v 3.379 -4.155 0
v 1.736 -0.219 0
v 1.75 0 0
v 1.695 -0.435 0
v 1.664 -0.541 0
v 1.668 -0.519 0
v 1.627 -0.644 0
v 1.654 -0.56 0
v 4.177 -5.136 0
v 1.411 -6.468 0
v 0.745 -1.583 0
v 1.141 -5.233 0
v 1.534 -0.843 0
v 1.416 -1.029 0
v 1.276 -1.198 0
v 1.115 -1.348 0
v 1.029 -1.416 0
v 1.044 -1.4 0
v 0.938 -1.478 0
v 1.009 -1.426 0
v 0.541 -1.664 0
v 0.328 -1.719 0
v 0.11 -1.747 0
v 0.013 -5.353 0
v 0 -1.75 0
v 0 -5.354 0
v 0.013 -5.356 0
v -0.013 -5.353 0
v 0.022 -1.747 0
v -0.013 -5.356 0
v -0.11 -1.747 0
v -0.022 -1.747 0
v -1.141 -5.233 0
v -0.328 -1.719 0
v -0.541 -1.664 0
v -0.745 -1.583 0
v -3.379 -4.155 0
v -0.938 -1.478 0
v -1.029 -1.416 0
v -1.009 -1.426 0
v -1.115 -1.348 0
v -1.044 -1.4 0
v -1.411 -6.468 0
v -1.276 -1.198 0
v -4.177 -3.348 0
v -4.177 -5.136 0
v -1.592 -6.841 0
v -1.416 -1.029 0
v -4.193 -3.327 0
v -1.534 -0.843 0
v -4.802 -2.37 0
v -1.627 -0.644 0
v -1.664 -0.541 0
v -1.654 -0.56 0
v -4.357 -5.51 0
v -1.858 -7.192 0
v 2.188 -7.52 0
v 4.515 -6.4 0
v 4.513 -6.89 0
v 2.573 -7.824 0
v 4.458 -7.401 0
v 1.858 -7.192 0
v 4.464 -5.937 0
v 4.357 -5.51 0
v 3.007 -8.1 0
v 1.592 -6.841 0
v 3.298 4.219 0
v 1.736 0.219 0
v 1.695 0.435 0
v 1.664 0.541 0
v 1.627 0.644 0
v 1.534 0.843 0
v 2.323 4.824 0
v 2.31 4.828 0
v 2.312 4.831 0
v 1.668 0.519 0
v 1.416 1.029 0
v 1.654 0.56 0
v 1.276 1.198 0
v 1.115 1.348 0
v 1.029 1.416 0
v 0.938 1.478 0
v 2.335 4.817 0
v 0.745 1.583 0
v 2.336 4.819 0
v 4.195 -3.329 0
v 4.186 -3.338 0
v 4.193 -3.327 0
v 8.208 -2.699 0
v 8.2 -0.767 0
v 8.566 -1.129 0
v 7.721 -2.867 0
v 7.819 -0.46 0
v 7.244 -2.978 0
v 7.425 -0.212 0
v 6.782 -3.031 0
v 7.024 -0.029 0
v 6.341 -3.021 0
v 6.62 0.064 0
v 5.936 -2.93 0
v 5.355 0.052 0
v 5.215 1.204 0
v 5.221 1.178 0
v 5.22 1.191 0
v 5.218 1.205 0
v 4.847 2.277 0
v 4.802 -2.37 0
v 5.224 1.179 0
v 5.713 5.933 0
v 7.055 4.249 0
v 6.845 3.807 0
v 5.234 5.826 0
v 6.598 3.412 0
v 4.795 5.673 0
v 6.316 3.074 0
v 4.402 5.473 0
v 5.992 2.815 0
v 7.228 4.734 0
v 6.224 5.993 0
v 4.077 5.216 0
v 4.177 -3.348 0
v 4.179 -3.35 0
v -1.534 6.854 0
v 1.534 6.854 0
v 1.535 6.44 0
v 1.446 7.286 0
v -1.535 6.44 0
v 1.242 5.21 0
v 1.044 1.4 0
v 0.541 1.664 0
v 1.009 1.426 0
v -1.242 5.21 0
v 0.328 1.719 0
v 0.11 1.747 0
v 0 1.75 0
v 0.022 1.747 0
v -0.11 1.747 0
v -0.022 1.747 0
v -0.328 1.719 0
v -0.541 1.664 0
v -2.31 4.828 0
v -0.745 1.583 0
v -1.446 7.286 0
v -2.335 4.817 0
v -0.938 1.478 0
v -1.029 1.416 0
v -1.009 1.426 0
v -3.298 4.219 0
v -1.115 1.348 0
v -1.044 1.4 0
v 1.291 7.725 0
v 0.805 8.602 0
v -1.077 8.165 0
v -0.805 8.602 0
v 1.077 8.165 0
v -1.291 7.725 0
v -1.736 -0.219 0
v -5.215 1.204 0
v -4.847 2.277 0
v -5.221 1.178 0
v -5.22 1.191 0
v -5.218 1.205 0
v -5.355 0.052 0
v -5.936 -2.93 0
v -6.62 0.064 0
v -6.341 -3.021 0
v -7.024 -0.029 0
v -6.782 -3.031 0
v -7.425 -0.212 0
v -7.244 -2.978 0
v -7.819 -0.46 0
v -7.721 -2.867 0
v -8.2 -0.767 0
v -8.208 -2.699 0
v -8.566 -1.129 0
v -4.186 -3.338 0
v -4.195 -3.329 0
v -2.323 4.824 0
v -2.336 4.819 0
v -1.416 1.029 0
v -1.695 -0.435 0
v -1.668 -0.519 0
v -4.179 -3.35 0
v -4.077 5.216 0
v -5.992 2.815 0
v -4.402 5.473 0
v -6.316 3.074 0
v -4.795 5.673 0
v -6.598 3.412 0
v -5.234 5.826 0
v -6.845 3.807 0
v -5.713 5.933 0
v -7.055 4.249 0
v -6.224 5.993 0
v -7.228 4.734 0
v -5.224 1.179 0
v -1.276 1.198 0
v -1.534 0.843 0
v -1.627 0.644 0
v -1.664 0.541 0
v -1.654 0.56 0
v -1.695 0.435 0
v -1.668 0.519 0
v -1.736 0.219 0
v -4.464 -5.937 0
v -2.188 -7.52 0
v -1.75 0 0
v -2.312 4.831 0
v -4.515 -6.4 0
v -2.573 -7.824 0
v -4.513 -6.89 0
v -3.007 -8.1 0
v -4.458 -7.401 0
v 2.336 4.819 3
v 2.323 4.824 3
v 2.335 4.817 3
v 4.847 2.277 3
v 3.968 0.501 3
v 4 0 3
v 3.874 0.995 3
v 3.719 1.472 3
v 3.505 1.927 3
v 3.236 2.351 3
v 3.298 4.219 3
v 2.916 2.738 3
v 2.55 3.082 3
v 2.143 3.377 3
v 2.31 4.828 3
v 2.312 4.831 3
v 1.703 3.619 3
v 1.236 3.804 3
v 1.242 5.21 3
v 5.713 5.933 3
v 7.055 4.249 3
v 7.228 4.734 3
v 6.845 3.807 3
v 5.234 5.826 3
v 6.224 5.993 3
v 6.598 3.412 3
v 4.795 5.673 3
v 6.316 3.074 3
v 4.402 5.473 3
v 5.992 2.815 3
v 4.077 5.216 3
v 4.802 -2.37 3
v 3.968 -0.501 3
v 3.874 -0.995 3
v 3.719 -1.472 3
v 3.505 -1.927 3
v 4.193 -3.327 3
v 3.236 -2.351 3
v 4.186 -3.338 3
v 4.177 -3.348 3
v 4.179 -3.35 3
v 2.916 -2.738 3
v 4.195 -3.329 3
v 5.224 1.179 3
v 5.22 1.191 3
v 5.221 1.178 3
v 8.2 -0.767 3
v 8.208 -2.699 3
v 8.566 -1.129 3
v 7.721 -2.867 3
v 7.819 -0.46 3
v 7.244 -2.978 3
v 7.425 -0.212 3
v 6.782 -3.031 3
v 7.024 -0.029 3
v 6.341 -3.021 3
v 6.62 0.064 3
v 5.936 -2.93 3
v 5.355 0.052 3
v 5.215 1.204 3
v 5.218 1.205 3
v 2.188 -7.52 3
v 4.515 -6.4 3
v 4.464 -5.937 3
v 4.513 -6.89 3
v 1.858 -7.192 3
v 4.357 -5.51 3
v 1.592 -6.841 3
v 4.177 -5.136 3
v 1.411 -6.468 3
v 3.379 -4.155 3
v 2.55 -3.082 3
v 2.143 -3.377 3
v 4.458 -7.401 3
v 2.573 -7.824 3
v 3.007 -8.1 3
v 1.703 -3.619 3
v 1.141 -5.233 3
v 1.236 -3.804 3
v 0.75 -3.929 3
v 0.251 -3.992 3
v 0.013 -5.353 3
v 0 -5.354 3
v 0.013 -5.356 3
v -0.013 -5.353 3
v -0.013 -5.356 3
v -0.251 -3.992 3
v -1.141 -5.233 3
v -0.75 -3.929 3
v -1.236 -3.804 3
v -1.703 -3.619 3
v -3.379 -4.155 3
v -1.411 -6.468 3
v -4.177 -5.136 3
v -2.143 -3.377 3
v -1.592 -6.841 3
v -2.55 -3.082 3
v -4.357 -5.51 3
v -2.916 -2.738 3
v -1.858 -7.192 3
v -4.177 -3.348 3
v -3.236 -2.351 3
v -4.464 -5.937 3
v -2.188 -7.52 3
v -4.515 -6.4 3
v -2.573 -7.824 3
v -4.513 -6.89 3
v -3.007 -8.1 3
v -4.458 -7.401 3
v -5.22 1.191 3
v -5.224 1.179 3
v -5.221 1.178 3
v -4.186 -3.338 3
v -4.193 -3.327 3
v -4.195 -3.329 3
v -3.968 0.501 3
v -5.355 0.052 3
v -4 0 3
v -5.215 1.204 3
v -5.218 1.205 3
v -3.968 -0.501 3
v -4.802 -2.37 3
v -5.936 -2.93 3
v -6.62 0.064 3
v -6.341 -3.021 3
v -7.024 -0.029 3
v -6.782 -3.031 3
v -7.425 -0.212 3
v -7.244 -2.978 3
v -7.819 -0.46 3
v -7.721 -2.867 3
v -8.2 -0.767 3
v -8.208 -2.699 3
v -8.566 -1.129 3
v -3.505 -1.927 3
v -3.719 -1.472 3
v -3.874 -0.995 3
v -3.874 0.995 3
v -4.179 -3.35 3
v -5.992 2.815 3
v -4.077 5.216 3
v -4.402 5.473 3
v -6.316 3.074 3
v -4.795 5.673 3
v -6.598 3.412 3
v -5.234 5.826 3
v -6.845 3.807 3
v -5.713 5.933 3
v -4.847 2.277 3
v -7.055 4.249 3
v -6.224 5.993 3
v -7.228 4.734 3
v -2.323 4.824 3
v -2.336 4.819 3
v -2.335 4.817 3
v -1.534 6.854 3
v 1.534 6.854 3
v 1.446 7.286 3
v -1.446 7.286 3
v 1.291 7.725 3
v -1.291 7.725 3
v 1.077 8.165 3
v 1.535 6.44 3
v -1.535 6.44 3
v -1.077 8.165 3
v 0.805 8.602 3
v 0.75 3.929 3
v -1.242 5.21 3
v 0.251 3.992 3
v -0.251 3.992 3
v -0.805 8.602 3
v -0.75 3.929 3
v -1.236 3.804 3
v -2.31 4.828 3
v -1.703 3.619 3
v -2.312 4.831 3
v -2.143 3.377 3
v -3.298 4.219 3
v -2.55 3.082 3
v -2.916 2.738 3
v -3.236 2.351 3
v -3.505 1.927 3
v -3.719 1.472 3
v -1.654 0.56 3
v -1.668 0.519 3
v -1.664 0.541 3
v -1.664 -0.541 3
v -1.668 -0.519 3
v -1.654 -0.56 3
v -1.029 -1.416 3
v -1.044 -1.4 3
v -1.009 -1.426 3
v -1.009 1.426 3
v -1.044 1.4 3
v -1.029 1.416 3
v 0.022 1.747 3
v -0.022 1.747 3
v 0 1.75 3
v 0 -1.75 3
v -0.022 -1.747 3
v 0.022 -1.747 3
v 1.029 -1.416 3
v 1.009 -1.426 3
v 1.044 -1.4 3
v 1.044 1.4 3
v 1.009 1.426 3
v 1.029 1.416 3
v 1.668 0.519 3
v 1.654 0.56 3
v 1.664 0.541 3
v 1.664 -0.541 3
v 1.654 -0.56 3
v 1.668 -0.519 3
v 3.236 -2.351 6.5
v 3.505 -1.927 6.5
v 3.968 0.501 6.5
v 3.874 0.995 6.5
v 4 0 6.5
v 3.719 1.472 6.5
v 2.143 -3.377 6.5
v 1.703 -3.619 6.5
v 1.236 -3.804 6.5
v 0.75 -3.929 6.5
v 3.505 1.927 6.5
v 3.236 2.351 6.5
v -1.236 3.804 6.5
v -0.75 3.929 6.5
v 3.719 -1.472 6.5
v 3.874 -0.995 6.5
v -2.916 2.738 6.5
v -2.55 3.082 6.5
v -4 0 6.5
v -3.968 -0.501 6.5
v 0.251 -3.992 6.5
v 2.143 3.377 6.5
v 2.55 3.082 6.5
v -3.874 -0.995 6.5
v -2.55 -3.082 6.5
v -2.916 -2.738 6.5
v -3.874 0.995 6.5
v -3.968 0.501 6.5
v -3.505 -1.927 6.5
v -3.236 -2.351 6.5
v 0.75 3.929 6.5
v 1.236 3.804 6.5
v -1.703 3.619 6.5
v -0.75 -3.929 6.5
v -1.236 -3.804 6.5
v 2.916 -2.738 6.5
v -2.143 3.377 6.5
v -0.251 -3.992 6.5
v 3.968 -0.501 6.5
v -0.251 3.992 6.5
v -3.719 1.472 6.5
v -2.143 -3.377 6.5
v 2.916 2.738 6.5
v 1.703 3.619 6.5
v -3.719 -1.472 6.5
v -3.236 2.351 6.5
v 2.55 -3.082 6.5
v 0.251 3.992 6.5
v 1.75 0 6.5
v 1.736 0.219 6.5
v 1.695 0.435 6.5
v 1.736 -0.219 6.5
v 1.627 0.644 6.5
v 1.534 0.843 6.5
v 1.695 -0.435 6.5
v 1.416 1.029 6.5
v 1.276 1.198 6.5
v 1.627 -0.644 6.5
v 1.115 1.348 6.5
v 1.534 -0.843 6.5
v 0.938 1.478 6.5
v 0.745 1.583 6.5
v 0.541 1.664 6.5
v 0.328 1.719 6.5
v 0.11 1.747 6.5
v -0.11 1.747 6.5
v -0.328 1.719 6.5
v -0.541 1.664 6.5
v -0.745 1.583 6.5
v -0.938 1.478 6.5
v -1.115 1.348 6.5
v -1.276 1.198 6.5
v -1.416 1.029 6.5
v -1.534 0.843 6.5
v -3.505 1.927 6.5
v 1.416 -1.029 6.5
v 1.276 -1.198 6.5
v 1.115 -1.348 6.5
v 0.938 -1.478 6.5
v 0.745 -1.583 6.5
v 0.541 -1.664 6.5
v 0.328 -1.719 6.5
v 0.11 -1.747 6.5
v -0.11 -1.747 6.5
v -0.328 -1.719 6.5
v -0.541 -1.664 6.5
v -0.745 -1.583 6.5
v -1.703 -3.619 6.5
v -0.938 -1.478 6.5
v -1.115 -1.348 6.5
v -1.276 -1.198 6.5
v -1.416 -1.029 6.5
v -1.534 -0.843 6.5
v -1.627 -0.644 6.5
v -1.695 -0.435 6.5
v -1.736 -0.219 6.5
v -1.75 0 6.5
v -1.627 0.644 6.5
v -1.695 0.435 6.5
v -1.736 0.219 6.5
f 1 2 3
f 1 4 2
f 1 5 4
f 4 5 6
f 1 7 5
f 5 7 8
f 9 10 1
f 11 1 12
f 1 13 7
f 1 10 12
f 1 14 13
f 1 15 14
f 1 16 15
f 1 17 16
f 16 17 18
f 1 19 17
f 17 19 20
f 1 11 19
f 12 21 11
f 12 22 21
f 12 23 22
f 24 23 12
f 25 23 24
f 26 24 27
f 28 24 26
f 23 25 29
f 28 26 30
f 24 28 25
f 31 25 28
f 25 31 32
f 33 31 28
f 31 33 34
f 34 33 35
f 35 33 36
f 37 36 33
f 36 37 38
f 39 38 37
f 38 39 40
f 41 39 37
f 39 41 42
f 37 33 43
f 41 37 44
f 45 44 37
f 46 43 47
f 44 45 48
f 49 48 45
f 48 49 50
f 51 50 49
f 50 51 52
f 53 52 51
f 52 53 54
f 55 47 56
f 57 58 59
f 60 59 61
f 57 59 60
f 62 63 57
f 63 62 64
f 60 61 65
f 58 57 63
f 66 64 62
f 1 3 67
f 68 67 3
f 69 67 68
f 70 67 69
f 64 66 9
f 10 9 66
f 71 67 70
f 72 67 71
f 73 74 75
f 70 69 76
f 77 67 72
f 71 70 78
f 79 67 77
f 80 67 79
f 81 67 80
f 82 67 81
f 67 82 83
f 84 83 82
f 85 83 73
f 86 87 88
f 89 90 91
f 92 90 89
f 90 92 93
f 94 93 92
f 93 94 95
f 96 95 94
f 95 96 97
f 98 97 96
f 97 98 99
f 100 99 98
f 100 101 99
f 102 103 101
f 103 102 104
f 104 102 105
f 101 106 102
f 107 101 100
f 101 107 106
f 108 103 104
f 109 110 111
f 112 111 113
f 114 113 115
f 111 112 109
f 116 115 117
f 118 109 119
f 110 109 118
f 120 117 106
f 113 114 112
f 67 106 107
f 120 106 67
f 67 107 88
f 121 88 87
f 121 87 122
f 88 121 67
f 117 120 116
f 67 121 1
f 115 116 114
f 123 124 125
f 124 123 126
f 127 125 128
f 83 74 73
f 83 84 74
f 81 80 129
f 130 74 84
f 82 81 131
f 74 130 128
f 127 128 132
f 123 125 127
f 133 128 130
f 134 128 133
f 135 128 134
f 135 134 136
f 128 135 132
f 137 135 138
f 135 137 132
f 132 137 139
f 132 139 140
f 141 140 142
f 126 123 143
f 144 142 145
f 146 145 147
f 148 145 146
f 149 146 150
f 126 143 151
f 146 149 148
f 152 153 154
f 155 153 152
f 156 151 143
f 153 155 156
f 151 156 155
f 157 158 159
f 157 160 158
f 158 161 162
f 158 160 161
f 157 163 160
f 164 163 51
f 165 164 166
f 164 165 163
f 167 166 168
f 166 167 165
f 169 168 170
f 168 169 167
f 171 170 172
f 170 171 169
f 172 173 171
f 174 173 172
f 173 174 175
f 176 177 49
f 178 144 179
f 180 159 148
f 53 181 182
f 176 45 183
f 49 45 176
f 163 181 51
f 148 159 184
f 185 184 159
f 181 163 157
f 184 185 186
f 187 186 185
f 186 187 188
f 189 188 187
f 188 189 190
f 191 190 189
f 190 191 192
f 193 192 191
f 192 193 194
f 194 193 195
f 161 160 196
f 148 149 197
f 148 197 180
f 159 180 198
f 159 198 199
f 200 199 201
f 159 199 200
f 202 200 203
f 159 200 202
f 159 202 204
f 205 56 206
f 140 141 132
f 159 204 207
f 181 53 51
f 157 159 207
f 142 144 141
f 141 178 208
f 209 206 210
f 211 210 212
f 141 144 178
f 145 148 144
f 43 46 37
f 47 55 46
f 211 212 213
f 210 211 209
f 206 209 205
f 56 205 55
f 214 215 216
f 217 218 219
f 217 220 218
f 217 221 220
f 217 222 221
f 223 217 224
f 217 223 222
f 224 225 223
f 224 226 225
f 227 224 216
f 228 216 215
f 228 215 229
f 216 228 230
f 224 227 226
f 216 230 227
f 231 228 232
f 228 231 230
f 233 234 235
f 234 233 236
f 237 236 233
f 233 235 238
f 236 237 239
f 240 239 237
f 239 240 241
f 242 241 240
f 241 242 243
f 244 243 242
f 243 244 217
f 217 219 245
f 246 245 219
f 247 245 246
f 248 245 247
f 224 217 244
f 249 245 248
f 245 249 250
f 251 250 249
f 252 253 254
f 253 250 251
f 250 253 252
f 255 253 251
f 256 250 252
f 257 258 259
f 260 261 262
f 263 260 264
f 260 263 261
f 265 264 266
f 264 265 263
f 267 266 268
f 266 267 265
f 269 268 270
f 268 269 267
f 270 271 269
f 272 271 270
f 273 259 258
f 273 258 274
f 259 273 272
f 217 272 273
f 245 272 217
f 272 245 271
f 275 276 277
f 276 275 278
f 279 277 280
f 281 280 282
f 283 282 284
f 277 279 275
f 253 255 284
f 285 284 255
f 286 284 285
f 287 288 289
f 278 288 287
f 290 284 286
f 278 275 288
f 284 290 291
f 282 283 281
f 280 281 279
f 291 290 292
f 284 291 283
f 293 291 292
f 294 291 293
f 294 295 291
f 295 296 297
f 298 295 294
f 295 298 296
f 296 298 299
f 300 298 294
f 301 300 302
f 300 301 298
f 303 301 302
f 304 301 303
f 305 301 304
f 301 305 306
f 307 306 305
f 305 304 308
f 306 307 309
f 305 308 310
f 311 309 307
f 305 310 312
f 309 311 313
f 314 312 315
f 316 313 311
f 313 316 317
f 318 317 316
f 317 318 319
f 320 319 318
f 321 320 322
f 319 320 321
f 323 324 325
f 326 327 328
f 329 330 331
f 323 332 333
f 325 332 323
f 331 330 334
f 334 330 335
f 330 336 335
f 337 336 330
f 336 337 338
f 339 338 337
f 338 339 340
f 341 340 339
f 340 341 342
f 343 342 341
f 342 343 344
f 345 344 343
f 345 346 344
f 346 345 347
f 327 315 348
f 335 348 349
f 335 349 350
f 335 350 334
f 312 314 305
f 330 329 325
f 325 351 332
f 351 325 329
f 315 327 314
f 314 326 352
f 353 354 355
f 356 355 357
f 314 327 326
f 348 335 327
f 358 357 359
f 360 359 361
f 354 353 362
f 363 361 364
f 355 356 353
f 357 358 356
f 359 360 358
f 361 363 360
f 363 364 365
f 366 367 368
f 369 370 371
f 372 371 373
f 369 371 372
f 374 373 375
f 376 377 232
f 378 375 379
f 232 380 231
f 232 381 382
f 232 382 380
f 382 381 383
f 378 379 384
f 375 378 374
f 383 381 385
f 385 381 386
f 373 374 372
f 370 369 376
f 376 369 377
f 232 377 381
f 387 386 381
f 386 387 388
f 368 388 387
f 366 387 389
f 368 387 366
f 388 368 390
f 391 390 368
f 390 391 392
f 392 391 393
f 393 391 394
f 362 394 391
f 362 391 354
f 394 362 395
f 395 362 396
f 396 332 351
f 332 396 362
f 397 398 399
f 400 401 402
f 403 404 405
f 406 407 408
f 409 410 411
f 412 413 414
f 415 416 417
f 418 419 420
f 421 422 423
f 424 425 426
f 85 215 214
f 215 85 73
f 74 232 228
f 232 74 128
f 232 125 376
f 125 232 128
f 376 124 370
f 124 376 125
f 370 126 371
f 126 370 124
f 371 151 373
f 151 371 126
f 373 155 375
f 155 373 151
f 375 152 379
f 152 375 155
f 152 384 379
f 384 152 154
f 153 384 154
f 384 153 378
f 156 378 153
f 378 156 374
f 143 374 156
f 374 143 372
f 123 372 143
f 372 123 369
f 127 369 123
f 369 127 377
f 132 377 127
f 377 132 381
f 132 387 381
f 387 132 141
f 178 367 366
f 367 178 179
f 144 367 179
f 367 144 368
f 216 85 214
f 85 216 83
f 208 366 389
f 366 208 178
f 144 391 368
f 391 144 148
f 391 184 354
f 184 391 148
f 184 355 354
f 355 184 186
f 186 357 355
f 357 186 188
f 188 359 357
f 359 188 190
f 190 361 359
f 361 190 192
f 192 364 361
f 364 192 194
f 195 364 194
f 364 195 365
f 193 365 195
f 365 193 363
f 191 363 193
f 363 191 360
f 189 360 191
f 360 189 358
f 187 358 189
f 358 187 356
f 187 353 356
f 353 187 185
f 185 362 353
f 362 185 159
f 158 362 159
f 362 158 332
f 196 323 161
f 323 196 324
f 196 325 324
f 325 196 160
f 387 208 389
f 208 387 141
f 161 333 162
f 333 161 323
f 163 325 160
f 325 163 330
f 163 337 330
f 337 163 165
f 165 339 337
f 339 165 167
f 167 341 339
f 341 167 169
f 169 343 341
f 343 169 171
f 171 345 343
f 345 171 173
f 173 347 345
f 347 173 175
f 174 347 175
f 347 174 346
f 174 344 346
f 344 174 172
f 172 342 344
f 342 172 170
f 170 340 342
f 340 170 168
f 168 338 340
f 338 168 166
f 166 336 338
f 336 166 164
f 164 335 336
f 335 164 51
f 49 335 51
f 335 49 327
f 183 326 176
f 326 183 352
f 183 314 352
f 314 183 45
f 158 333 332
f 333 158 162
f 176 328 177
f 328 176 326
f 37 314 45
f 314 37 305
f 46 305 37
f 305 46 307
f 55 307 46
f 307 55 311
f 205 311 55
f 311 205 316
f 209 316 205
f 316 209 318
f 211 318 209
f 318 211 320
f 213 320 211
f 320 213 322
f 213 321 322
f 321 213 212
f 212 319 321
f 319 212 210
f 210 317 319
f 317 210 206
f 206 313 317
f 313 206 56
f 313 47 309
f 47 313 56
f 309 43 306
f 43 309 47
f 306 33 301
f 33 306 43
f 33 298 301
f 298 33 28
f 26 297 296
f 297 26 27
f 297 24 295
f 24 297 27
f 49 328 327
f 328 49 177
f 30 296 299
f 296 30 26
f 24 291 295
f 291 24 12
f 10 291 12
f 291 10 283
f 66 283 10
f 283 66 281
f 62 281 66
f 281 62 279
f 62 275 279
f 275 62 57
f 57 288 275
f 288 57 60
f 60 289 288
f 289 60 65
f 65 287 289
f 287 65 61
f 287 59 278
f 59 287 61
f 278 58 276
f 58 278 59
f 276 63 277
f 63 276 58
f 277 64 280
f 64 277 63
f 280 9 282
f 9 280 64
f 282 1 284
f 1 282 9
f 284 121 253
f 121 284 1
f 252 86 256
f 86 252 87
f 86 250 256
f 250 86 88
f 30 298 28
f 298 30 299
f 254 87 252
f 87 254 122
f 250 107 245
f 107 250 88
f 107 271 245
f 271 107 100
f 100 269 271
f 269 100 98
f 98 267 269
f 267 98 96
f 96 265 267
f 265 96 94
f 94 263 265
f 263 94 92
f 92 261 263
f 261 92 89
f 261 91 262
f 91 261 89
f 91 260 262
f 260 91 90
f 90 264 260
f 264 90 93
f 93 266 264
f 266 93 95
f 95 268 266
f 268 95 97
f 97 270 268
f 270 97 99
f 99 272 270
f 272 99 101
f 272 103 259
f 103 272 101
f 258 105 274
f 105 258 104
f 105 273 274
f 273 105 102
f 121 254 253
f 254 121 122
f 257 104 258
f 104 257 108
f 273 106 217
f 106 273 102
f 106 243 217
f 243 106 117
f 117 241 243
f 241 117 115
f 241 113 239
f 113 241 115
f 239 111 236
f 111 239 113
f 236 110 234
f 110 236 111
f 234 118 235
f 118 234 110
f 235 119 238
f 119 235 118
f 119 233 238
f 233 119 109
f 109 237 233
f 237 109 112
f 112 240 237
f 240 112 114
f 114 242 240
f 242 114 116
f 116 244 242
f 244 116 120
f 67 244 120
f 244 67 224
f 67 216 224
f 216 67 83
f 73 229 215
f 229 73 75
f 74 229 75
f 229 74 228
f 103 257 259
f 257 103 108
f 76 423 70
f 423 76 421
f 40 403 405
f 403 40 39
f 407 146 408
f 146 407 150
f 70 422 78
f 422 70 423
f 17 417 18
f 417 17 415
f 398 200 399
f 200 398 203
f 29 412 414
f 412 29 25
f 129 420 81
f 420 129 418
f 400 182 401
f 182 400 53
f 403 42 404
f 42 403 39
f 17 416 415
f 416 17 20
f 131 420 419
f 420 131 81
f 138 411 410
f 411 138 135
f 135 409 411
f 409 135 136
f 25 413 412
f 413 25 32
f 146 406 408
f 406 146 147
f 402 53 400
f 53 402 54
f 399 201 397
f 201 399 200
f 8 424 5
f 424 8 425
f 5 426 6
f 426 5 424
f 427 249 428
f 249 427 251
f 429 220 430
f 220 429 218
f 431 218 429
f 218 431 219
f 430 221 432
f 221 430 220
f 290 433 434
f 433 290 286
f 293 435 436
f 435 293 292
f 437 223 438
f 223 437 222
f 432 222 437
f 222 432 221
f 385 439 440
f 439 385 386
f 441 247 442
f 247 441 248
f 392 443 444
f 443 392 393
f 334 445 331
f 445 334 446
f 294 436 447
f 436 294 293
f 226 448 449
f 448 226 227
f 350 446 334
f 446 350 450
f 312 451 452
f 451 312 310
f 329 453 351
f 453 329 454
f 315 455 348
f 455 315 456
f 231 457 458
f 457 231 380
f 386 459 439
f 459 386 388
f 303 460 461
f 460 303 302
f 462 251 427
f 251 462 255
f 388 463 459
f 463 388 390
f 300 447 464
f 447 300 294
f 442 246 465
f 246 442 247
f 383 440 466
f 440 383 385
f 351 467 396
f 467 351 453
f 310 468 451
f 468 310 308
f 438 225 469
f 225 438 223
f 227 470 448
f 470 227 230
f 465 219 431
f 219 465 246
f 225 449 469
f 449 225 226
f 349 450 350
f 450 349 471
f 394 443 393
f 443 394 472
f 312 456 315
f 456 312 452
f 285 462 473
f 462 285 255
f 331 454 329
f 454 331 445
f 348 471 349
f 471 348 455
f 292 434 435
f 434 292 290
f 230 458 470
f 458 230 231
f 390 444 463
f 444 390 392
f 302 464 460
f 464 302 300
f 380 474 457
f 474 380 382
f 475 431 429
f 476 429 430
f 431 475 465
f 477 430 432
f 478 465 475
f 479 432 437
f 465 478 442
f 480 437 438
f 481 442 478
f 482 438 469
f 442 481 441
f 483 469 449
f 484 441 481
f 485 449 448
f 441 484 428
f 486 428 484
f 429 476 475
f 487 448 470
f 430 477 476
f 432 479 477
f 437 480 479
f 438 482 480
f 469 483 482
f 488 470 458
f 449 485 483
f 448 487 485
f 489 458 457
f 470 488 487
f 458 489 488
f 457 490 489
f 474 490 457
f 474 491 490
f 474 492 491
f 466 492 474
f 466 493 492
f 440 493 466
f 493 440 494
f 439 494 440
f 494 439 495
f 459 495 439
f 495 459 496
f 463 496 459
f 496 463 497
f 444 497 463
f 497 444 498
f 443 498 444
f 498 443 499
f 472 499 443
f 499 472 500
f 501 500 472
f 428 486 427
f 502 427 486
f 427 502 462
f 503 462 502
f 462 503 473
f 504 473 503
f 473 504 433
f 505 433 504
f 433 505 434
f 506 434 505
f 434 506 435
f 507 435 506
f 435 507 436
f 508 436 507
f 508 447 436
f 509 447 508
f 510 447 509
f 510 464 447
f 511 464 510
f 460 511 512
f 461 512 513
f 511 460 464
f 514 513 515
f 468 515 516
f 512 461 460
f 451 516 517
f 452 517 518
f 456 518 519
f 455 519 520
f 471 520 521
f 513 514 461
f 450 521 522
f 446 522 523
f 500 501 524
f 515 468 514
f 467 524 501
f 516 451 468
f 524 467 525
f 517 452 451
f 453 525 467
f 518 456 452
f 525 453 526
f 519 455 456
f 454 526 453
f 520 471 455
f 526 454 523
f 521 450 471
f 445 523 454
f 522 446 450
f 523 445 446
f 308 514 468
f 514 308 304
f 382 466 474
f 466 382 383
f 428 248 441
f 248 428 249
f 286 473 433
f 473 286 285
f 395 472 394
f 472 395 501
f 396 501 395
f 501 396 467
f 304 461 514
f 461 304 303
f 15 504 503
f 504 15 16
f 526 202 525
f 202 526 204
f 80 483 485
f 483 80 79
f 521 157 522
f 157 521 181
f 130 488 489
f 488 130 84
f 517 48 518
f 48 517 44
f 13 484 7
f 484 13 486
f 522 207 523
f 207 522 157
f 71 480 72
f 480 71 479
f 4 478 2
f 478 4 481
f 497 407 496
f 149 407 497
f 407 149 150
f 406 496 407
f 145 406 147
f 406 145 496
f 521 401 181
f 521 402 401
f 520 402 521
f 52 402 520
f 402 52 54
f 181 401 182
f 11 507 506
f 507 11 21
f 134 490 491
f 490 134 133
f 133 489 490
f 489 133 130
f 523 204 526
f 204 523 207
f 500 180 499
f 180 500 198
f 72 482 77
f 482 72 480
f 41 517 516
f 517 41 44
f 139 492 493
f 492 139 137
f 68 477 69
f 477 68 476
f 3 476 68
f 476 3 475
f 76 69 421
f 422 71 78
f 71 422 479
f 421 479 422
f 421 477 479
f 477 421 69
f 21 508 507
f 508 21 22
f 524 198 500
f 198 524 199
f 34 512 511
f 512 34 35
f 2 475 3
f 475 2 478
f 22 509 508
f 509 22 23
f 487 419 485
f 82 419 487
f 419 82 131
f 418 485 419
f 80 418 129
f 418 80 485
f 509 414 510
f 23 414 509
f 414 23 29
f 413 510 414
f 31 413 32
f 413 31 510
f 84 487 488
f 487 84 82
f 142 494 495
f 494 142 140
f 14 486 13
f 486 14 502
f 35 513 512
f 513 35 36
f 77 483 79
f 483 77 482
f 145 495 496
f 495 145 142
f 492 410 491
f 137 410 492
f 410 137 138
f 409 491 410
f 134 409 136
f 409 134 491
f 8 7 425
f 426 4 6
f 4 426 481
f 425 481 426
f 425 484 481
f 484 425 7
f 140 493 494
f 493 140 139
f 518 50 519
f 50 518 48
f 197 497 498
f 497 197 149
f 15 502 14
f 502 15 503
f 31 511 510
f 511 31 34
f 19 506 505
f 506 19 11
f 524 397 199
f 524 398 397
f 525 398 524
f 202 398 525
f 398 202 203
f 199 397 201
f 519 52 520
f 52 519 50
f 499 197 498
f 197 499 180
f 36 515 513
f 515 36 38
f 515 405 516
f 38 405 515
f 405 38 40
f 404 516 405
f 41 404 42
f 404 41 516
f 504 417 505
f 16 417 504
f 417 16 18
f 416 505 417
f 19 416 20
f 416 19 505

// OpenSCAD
//////////////////////////////////////////////////////////////////////////////////////////////
// Public Domain Parametric Involute Spur Gear (and involute helical gear and involute rack)
// version 1.1
// by Leemon Baird, 2011, Leemon@Leemon.com
//http://www.thingiverse.com/thing:5505
//
// This file is public domain.  Use it for any purpose, including commercial
// applications.  Attribution would be nice, but is not required.  There is
// no warranty of any kind, including its correctness, usefulness, or safety.
// 
// This is parameterized involute spur (or helical) gear.  It is much simpler and less powerful than
// others on Thingiverse.  But it is public domain.  I implemented it from scratch from the 
// descriptions and equations on Wikipedia and the web, using Mathematica for calculations and testing,
// and I now release it into the public domain.
//
//		http://en.wikipedia.org/wiki/Involute_gear
//		http://en.wikipedia.org/wiki/Gear
//		http://en.wikipedia.org/wiki/List_of_gear_nomenclature
//		http://gtrebaol.free.fr/doc/catia/spur_gear.html
//		http://www.cs.cmu.edu/~rapidproto/mechanisms/chpt7.html
//
// The module gear() gives an involute spur gear, with reasonable defaults for all the parameters.
// Normally, you should just choose the first 4 parameters, and let the rest be default values.
// The module gear() gives a gear in the XY plane, centered on the origin, with one tooth centered on
// the positive Y axis.  The various functions below it take the same parameters, and return various
// measurements for the gear.  The most important is pitch_radius, which tells how far apart to space
// gears that are meshing, and adendum_radius, which gives the size of the region filled by the gear.
// A gear has a "pitch circle", which is an invisible circle that cuts through the middle of each
// tooth (though not the exact center). In order for two gears to mesh, their pitch circles should 
// just touch.  So the distance between their centers should be pitch_radius() for one, plus pitch_radius() 
// for the other, which gives the radii of their pitch circles.
//
// In order for two gears to mesh, they must have the same mm_per_tooth and pressure_angle parameters.  
// mm_per_tooth gives the number of millimeters of arc around the pitch circle covered by one tooth and one
// space between teeth.  The pitch angle controls how flat or bulged the sides of the teeth are.  Common
// values include 14.5 degrees and 20 degrees, and occasionally 25.  Though I've seen 28 recommended for
// plastic gears. Larger numbers bulge out more, giving stronger teeth, so 28 degrees is the default here.
//
// The ratio of number_of_teeth for two meshing gears gives how many times one will make a full 
// revolution when the the other makes one full revolution.  If the two numbers are coprime (i.e. 
// are not both divisible by the same number greater than 1), then every tooth on one gear
// will meet every tooth on the other, for more even wear.  So coprime numbers of teeth are good.
//
// The module rack() gives a rack, which is a bar with teeth.  A rack can mesh with any
// gear that has the same mm_per_tooth and pressure_angle.
//
// Some terminology: 
// The outline of a gear is a smooth circle (the "pitch circle") which has mountains and valleys
// added so it is toothed.  So there is an inner circle (the "root circle") that touches the 
// base of all the teeth, an outer circle that touches the tips of all the teeth,
// and the invisible pitch circle in between them.  There is also a "base circle", which can be smaller than
// all three of the others, which controls the shape of the teeth.  The side of each tooth lies on the path 
// that the end of a string would follow if it were wrapped tightly around the base circle, then slowly unwound.  
// That shape is an "involute", which gives this type of gear its name.
//
//////////////////////////////////////////////////////////////////////////////////////////////

translate([0,0,1.5]){

	difference(){
		union(){
			gear();
			
			translate([0,0,1.5])
			cylinder(r=4, h=3.5, $fn=50);

		}
		
		cylinder(r=3.5/2, h=20, $fn=50, center=true);	//hole for M3 screw
		
	
	}

}



//An involute spur gear, with reasonable defaults for all the parameters.
//Normally, you should just choose the first 4 parameters, and let the rest be default values.
//Meshing gears must match in mm_per_tooth, pressure_angle, and twist,
//and be separated by the sum of their pitch radii, which can be found with pitch_radius().
module gear (
	mm_per_tooth    = 6.73,    //this is the "circular pitch", the circumference of the pitch circle divided by the number of teeth
	number_of_teeth = 7,   //total number of teeth around the entire perimeter
	thickness       = 3,    //thickness of gear in mm
	hole_diameter   = 3.5,    //diameter of the hole in the center, in mm
	twist           = 0,    //teeth rotate this many degrees from bottom of gear to top.  360 makes the gear a screw with each thread going around once
	teeth_to_hide   = 0,    //number of teeth to delete to make this only a fraction of a circle
	pressure_angle  = 28,   //Controls how straight or bulged the tooth sides are. In degrees.
	clearance       = 1,  //gap between top of a tooth on one gear and bottom of valley on a meshing gear (in millimeters)
	backlash        = 1   //gap between two meshing teeth, in the direction along the circumference of the pitch circle
) {
	assign(pi = 3.1415926)
	assign(p  = mm_per_tooth * number_of_teeth / pi / 2)  //radius of pitch circle
	assign(c  = p + mm_per_tooth / pi - clearance)        //radius of outer circle
	assign(b  = p*cos(pressure_angle))                    //radius of base circle
	assign(r  = p-(c-p)-clearance)                        //radius of root circle
	assign(t  = mm_per_tooth/2-backlash/2)                //tooth thickness at pitch circle
	assign(k  = -iang(b, p) - t/2/p/pi*180) {             //angle to where involute meets base circle on each side of tooth
		difference() {
			for (i = [0:number_of_teeth-teeth_to_hide-1] )
				rotate([0,0,i*360/number_of_teeth])
					linear_extrude(height = thickness, center = true, convexity = 10, twist = twist)
						polygon(
							points=[
								[0, -hole_diameter/10],
								polar(r, -181/number_of_teeth),
								polar(r, r<b ? k : -180/number_of_teeth),
								q7(0/5,r,b,c,k, 1),q7(1/5,r,b,c,k, 1),q7(2/5,r,b,c,k, 1),q7(3/5,r,b,c,k, 1),q7(4/5,r,b,c,k, 1),q7(5/5,r,b,c,k, 1),
								q7(5/5,r,b,c,k,-1),q7(4/5,r,b,c,k,-1),q7(3/5,r,b,c,k,-1),q7(2/5,r,b,c,k,-1),q7(1/5,r,b,c,k,-1),q7(0/5,r,b,c,k,-1),
								polar(r, r<b ? -k : 180/number_of_teeth),
								polar(r, 181/number_of_teeth)
							],
 							paths=[[0,1,2,3,4,5,6,7,8,9,10,11,12,13,14,15,16]]
						);
			cylinder(h=2*thickness+1, r=hole_diameter/2, center=true, $fn=20);
		}
	}
};	
//these 4 functions are used by gear
function polar(r,theta)   = r*[sin(theta), cos(theta)];                            //convert polar to cartesian coordinates
function iang(r1,r2)      = sqrt((r2/r1)*(r2/r1) - 1)/3.1415926*180 - acos(r1/r2); //unwind a string this many degrees to go from radius r1 to radius r2
function q7(f,r,b,r2,t,s) = q6(b,s,t,(1-f)*max(b,r)+f*r2);                         //radius a fraction f up the curved side of the tooth 
function q6(b,s,t,d)      = polar(d,s*(iang(b,d)+t));                              //point at radius d on the involute curve

//a rack, which is a straight line with teeth (the same as a segment from a giant gear with a huge number of teeth).
//The "pitch circle" is a line along the X axis.
module rack (
	mm_per_tooth    = 3,    //this is the "circular pitch", the circumference of the pitch circle divided by the number of teeth
	number_of_teeth = 11,   //total number of teeth along the rack
	thickness       = 6,    //thickness of rack in mm (affects each tooth)
	height          = 120,   //height of rack in mm, from tooth top to far side of rack.
	pressure_angle  = 28,   //Controls how straight or bulged the tooth sides are. In degrees.
	backlash        = 0.0   //gap between two meshing teeth, in the direction along the circumference of the pitch circle
) {
	assign(pi = 3.1415926)
	assign(a = mm_per_tooth / pi) //addendum
	assign(t = a*cos(pressure_angle)-1)         //tooth side is tilted so top/bottom corners move this amount
		for (i = [0:number_of_teeth-1] )
			translate([i*mm_per_tooth,0,0])
				linear_extrude(height = thickness, center = true, convexity = 10)
					polygon(
						points=[
							[-mm_per_tooth * 3/4,                 a-height],
							[-mm_per_tooth * 3/4 - backlash,     -a],
							[-mm_per_tooth * 1/4 + backlash - t, -a],
							[-mm_per_tooth * 1/4 + backlash + t,  a],
							[ mm_per_tooth * 1/4 - backlash - t,  a],
							[ mm_per_tooth * 1/4 - backlash + t, -a],
							[ mm_per_tooth * 3/4 + backlash,     -a],
							[ mm_per_tooth * 3/4,                 a-height],
						],
						paths=[[0,1,2,3,4,5,6,7]]
					);
};	

//These 5 functions let the user find the derived dimensions of the gear.
//A gear fits within a circle of radius outer_radius, and two gears should have
//their centers separated by the sum of their pictch_radius.
function circular_pitch  (mm_per_tooth=3) = mm_per_tooth;                     //tooth density expressed as "circular pitch" in millimeters
function diametral_pitch (mm_per_tooth=3) = 3.1415926 / mm_per_tooth;         //tooth density expressed as "diametral pitch" in teeth per millimeter
function module_value    (mm_per_tooth=3) = mm_per_tooth / pi;                //tooth density expressed as "module" or "modulus" in millimeters
function pitch_radius    (mm_per_tooth=3,number_of_teeth=11) = mm_per_tooth * number_of_teeth / 3.1415926 / 2;
function outer_radius    (mm_per_tooth=3,number_of_teeth=11,clearance=0.1)    //The gear fits entirely within a cylinder of this radius.
	= mm_per_tooth*(1+number_of_teeth/2)/3.1415926  - clearance;              

/////////////////////////////////////////////////////////////////////////////////////////////
//example gear train.  
//Try it with OpenSCAD View/Animate command with 20 steps and 24 FPS.
//The gears will continue to be rotated to mesh correctly if you change the number of teeth.

//n1 = 11; //red gear number of teeth
//n2 = 20; //green gear
//n3 = 5;  //blue gear
//n4 = 20; //orange gear
//n5 = 8;  //gray rack
//mm_per_tooth = 9; //all meshing gears need the same mm_per_tooth (and the same pressure_angle)
//thickness    = 6;
//hole         = 3;
//height       = 12;
//
//d1 =pitch_radius(mm_per_tooth,n1);
//d12=pitch_radius(mm_per_tooth,n1) + pitch_radius(mm_per_tooth,n2);
//d13=pitch_radius(mm_per_tooth,n1) + pitch_radius(mm_per_tooth,n3);
//d14=pitch_radius(mm_per_tooth,n1) + pitch_radius(mm_per_tooth,n4);
//
//translate([ 0,    0, 0]) rotate([0,0, $t*360/n1])                 color([1.00,0.75,0.75]) gear(mm_per_tooth,n1,thickness,hole);
//translate([ 0,  d12, 0]) rotate([0,0,-($t+n2/2-0*n1+1/2)*360/n2]) color([0.75,1.00,0.75]) gear(mm_per_tooth,n2,thickness,hole,0,108);
//translate([ d13,  0, 0]) rotate([0,0,-($t-n3/4+n1/4+1/2)*360/n3]) color([0.75,0.75,1.00]) gear(mm_per_tooth,n3,thickness,hole);
//translate([ d13,  0, 0]) rotate([0,0,-($t-n3/4+n1/4+1/2)*360/n3]) color([0.75,0.75,1.00]) gear(mm_per_tooth,n3,thickness,hole);
//translate([-d14,  0, 0]) rotate([0,0,-($t-n4/4-n1/4+1/2-floor(n4/4)-3)*360/n4]) color([1.00,0.75,0.50]) gear(mm_per_tooth,n4,thickness,hole,0,n4-3);
//translate([(-floor(n5/2)-floor(n1/2)+$t+n1/2-1/2)*9, -d1+0.0, 0]) rotate([0,0,0]) color([0.75,0.75,0.75]) rack(mm_per_tooth,n5,thickness,height);
